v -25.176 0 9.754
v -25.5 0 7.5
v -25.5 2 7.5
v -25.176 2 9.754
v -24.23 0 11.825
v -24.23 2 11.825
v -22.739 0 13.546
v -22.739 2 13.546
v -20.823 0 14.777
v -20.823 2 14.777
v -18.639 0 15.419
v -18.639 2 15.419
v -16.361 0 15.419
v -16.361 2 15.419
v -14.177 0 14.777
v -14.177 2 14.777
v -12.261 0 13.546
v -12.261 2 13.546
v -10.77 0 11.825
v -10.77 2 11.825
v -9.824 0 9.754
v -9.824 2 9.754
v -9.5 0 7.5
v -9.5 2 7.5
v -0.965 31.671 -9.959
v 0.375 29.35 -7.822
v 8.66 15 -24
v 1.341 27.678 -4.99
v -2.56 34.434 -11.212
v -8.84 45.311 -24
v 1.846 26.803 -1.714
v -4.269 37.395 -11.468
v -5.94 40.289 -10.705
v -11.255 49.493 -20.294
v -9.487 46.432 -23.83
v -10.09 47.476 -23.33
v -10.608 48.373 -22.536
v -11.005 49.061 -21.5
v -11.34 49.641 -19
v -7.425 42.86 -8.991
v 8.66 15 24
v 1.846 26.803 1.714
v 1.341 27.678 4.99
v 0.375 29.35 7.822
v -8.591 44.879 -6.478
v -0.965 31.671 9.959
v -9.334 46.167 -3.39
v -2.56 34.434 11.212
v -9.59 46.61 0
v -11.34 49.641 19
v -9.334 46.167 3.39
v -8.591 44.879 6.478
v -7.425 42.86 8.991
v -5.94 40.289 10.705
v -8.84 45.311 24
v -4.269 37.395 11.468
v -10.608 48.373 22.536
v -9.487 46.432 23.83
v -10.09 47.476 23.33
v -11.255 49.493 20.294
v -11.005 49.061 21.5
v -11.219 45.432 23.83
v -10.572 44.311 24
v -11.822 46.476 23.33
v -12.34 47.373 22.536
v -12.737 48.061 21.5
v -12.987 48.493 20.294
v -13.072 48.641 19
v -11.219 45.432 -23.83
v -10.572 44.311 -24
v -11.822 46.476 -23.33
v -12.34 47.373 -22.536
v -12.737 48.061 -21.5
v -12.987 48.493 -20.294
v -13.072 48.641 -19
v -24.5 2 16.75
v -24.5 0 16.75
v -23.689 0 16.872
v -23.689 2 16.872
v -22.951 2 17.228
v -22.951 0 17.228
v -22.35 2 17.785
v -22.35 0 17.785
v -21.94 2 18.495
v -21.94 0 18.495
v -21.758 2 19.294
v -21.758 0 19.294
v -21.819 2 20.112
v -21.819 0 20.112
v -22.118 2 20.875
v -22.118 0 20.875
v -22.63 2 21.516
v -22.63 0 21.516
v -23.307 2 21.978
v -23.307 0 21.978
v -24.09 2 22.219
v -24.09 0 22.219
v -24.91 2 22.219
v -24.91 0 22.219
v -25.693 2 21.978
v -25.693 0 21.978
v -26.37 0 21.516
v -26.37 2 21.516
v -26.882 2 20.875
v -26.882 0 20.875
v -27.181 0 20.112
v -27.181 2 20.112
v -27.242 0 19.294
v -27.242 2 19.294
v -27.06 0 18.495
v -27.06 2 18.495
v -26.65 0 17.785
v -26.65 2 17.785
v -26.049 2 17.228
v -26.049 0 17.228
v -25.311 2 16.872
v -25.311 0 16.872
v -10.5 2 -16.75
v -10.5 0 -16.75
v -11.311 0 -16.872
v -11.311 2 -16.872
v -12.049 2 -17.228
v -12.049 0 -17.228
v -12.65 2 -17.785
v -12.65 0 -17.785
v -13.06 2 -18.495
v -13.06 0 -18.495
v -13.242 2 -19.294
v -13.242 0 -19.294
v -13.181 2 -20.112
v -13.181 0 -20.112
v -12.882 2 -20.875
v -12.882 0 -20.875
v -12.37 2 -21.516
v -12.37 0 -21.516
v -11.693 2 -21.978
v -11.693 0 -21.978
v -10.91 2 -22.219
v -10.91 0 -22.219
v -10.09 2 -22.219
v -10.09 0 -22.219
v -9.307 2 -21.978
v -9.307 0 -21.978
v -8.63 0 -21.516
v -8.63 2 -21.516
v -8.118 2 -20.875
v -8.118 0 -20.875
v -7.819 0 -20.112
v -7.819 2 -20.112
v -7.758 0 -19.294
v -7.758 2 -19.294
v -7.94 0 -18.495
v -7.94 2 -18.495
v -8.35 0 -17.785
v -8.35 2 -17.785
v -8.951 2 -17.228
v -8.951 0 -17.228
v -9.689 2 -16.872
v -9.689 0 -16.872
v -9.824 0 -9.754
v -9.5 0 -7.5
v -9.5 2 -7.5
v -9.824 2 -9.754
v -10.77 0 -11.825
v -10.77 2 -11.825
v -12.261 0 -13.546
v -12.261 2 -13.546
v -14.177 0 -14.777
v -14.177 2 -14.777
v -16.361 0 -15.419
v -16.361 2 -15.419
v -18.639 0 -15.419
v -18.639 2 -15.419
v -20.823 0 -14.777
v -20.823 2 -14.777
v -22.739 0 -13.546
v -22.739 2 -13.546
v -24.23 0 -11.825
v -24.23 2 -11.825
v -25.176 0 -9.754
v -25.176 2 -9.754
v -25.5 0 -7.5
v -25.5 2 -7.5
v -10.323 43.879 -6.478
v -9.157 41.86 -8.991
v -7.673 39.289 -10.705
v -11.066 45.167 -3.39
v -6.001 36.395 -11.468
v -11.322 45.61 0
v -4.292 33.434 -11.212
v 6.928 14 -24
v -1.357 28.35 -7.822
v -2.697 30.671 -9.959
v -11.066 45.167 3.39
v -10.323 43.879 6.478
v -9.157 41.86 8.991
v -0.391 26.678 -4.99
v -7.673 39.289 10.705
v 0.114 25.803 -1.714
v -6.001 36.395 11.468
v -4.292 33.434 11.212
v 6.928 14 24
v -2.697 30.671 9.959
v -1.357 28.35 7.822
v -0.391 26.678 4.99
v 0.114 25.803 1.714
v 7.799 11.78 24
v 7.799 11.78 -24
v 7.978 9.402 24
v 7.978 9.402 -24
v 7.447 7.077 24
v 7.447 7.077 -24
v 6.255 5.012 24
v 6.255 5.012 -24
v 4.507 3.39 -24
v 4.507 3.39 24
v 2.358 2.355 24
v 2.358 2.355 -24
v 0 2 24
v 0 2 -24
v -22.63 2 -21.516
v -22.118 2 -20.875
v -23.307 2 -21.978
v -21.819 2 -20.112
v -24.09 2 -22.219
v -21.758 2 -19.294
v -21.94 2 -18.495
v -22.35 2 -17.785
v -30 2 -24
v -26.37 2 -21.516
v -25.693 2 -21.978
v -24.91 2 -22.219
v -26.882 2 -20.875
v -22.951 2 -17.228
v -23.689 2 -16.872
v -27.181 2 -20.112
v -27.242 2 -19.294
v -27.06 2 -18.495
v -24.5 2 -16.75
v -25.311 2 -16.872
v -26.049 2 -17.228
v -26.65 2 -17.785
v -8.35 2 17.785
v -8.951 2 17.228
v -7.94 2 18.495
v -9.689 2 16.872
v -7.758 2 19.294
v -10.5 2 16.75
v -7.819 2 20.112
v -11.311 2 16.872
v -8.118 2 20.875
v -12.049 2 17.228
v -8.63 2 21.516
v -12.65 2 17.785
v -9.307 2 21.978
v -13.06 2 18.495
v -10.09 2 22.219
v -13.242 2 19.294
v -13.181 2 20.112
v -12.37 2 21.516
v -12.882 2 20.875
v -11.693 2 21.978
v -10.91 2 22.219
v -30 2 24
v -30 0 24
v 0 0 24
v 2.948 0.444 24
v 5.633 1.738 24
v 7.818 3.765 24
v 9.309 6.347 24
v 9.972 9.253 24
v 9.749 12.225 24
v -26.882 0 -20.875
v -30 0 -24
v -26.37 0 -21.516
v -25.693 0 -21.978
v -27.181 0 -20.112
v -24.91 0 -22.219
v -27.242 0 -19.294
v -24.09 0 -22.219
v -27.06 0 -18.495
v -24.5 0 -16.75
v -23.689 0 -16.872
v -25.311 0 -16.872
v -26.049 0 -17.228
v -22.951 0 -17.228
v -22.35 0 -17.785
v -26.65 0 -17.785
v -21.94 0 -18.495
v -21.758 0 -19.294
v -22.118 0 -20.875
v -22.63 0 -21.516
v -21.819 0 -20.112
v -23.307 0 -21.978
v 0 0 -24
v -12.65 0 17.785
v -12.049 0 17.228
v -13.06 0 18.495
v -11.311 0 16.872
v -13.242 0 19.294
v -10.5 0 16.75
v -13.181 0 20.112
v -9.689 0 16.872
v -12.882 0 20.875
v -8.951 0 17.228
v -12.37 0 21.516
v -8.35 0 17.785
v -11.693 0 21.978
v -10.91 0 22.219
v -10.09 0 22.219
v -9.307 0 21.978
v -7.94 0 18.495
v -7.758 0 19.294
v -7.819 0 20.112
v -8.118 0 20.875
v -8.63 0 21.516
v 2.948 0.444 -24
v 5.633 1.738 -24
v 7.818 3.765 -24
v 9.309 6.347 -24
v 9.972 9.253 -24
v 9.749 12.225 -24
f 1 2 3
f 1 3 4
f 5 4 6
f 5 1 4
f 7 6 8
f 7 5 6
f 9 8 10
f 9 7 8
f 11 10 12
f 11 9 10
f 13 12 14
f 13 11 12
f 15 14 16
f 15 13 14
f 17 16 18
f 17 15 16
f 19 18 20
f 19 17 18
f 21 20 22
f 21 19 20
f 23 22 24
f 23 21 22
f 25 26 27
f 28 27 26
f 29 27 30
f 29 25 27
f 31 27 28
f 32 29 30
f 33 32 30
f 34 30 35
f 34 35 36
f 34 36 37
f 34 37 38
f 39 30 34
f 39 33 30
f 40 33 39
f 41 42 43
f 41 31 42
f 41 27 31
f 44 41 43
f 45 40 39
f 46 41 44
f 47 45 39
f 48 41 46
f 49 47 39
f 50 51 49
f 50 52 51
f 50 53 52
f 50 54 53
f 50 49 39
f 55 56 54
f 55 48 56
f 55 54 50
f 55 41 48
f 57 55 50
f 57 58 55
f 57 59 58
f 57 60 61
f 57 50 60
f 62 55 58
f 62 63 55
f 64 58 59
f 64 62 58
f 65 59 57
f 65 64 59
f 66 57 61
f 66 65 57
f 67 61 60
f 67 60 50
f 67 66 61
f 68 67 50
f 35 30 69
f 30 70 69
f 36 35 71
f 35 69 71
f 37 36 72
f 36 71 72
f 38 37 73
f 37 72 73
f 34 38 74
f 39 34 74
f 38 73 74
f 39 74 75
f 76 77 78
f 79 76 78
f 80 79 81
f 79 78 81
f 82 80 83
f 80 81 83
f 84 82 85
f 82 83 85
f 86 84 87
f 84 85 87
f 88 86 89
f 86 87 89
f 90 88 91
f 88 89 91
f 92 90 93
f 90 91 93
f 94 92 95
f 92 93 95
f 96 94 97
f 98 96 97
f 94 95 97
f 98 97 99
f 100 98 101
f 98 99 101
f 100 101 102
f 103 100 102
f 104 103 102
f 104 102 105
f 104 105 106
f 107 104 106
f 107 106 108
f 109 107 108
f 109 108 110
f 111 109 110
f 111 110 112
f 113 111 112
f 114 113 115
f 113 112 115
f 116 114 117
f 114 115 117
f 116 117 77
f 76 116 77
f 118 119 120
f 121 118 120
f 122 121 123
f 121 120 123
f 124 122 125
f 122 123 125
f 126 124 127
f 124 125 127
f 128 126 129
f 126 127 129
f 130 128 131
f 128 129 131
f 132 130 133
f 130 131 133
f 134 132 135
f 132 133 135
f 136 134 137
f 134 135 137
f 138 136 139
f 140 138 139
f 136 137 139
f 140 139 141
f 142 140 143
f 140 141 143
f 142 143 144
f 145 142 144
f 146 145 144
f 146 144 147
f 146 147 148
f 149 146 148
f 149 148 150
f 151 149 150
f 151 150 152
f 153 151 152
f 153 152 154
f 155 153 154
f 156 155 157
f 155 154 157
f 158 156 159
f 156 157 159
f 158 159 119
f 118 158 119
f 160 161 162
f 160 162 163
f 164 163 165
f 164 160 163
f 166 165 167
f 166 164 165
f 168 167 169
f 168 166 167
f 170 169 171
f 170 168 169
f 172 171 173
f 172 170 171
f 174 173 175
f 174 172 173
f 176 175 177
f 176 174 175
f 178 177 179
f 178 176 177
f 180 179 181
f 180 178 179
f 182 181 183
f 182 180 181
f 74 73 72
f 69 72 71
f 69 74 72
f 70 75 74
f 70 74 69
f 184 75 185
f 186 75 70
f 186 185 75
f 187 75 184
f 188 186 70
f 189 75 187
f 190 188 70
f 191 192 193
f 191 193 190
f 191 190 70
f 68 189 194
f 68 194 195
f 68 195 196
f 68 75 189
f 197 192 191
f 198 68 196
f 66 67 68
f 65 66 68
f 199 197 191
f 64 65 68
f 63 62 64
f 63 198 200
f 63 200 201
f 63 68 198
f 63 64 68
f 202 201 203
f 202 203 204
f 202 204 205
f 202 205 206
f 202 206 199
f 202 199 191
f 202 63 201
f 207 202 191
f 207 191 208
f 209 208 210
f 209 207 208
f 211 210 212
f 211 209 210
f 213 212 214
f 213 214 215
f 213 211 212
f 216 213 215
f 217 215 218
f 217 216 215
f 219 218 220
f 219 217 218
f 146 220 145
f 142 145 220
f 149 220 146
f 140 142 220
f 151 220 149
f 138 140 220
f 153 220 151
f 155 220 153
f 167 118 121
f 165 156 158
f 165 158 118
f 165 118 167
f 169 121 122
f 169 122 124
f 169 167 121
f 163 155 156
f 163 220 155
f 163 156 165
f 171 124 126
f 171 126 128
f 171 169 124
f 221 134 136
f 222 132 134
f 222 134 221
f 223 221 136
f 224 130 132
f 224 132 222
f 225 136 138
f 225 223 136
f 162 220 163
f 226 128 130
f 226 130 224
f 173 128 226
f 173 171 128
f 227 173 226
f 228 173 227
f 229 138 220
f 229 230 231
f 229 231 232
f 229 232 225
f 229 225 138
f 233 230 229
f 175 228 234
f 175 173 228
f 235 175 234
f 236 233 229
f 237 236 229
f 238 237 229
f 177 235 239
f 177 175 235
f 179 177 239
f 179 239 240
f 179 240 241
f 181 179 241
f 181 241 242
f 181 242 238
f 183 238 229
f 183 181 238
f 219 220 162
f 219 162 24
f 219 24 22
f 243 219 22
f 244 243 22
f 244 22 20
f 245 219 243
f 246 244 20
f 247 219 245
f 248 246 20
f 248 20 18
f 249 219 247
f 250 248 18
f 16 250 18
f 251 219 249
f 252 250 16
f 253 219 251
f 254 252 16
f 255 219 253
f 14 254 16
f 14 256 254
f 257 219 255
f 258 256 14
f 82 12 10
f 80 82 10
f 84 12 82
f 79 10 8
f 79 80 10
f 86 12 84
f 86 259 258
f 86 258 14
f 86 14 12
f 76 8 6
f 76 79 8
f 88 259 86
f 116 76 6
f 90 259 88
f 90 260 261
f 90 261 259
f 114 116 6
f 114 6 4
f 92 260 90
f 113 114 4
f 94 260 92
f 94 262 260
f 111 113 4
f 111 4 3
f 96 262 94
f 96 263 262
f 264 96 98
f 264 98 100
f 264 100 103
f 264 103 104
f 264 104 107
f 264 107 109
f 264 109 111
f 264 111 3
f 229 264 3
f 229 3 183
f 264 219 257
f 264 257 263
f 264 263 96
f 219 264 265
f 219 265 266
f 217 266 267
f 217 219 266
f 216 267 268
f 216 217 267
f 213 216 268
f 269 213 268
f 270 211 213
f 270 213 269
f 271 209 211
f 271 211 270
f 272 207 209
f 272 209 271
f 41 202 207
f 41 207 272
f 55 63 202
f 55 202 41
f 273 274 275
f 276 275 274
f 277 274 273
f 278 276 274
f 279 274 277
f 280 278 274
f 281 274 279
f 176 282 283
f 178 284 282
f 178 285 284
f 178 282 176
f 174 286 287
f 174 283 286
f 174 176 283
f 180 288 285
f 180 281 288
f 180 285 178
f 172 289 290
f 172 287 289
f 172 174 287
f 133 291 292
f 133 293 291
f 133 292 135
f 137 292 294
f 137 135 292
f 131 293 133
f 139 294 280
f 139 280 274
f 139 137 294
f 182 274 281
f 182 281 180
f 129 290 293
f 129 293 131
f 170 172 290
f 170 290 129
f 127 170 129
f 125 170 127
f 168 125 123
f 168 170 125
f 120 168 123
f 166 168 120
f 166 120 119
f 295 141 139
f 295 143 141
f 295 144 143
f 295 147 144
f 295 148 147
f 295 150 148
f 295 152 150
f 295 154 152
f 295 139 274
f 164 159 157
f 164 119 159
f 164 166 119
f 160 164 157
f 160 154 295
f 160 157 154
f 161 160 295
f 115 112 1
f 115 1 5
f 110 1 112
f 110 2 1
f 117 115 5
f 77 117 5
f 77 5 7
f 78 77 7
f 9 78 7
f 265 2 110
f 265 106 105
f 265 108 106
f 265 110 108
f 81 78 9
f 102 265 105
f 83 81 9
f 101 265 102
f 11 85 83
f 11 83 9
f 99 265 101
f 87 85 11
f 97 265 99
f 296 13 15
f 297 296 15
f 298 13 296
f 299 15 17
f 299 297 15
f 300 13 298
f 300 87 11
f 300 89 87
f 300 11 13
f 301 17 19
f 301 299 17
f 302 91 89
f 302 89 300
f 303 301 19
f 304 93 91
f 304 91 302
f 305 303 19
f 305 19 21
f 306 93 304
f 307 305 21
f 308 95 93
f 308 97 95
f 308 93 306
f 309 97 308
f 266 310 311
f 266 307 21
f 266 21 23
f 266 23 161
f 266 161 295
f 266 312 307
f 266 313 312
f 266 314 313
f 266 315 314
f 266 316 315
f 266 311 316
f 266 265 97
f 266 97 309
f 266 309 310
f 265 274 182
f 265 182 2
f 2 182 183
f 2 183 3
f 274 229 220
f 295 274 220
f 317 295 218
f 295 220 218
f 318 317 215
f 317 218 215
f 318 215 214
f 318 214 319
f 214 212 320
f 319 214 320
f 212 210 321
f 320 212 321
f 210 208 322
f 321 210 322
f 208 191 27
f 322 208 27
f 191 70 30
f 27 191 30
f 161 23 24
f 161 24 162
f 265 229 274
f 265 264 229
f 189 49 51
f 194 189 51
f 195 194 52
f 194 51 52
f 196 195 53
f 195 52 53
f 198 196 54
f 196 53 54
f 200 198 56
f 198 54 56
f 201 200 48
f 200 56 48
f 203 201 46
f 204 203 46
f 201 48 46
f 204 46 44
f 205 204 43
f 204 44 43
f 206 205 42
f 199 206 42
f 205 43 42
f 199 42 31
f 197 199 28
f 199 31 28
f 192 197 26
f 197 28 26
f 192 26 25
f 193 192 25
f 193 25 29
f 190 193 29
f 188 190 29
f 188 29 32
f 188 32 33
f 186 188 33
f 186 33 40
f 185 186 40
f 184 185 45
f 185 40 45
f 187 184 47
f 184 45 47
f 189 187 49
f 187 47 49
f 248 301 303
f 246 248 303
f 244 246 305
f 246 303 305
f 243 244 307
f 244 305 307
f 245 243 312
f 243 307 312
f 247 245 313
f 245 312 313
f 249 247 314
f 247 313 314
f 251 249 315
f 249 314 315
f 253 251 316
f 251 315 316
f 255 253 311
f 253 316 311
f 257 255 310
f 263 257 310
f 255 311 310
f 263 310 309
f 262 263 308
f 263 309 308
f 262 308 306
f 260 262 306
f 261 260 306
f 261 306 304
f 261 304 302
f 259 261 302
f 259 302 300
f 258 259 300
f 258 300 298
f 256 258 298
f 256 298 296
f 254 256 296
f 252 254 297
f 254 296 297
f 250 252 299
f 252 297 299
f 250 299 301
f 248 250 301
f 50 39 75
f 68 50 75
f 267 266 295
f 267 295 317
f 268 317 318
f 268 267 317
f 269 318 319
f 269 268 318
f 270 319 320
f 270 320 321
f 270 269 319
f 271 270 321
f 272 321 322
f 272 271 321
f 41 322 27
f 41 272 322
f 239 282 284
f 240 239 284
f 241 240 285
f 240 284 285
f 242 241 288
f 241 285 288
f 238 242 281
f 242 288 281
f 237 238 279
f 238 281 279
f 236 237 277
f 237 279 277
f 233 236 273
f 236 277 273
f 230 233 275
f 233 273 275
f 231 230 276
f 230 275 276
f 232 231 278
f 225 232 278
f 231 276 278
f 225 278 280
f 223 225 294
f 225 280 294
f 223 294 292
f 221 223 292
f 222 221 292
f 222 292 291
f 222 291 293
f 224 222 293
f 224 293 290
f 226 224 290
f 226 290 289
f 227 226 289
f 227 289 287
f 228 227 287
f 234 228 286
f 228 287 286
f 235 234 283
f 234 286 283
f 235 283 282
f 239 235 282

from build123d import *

# Parameters (mm, degrees)
SM_BASE_FLANGE_1_DEPTH = 24
SKETCH_3_R             = 2.75
CUT_EXTRUDE_1_DEPTH    = 2
SKETCH_4_R             = 11.5
CUT_EXTRUDE_2_DEPTH    = 2
FILLET_1_R             = 5
CUT_EXTRUDE_3_DEPTH    = 2


# Sheet-metal steps are written as plain solids
with BuildPart() as part:
    # Sketch 1 → 基体-法兰1 (new, symmetric)
    with BuildSketch(Plane.XY):
        with BuildLine():
            Line((-30, 0), (0, 0))
            ThreePointArc((0, 0), (8.660254038, 5), (8.660254038, 15))
            Line((8.660254038, 15), (-11.339745962, 49.641016151))
            Line((-11.339745962, 49.641016151), (-13.07179677, 48.641016151))
            Line((-13.07179677, 48.641016151), (6.92820323, 14))
            ThreePointArc((6.92820323, 14), (6.92820323, 6), (0, 2))
            Line((0, 2), (-30, 2))
            Line((-30, 2), (-30, 0))
        make_face()
    extrude(amount=SM_BASE_FLANGE_1_DEPTH, both=True)

    # 草图3 → 切除-拉伸1 (cut)
    with BuildSketch(Plane.XZ):
        with Locations(Location((-24.5, 19.5, 0), (0, 0, 270))):
            Circle(SKETCH_3_R)
        with Locations(Location((-10.5, 19.5, 0), (0, 0, 270))):
            Circle(SKETCH_3_R)
        with Locations(Location((-10.5, -19.5, 0), (0, 0, 90))):
            Circle(SKETCH_3_R)
        with Locations(Location((-24.5, -19.5, 0), (0, 0, 90))):
            Circle(SKETCH_3_R)
    extrude(amount=-CUT_EXTRUDE_1_DEPTH, mode=Mode.SUBTRACT)

    # 草图4 → 切除-拉伸2 (cut)
    with BuildSketch(Plane(origin=(12.990381057, 7.5, 0), x_dir=(0, 0, -1), z_dir=(0.8660254037844363, 0.5000000000000041, 0))):
        with Locations(Location((0, 33.660254038, 0), (0, 0, 90))):
            Circle(SKETCH_4_R)
    extrude(amount=-CUT_EXTRUDE_2_DEPTH, mode=Mode.SUBTRACT)

    # 圆角1
    fillet_1_edges = [part.edges().sort_by_distance(p)[0] for p in [
        (-12.205771366, 49.141016151, 24),
        (-12.205771366, 49.141016151, -24),
    ]]
    fillet(fillet_1_edges, radius=FILLET_1_R)

    # 草图5 → 切除-拉伸3 (cut)
    with BuildSketch(Plane.XZ):
        with BuildLine():
            Line((-9.5, 7.5), (-9.5, -7.5))
            ThreePointArc((-9.5, -7.5), (-17.5, -15.5), (-25.5, -7.5))
            Line((-25.5, -7.5), (-25.5, 7.5))
            ThreePointArc((-25.5, 7.5), (-17.5, 15.5), (-9.5, 7.5))
        make_face()
    extrude(amount=-CUT_EXTRUDE_3_DEPTH, mode=Mode.SUBTRACT)


solid = part.part
